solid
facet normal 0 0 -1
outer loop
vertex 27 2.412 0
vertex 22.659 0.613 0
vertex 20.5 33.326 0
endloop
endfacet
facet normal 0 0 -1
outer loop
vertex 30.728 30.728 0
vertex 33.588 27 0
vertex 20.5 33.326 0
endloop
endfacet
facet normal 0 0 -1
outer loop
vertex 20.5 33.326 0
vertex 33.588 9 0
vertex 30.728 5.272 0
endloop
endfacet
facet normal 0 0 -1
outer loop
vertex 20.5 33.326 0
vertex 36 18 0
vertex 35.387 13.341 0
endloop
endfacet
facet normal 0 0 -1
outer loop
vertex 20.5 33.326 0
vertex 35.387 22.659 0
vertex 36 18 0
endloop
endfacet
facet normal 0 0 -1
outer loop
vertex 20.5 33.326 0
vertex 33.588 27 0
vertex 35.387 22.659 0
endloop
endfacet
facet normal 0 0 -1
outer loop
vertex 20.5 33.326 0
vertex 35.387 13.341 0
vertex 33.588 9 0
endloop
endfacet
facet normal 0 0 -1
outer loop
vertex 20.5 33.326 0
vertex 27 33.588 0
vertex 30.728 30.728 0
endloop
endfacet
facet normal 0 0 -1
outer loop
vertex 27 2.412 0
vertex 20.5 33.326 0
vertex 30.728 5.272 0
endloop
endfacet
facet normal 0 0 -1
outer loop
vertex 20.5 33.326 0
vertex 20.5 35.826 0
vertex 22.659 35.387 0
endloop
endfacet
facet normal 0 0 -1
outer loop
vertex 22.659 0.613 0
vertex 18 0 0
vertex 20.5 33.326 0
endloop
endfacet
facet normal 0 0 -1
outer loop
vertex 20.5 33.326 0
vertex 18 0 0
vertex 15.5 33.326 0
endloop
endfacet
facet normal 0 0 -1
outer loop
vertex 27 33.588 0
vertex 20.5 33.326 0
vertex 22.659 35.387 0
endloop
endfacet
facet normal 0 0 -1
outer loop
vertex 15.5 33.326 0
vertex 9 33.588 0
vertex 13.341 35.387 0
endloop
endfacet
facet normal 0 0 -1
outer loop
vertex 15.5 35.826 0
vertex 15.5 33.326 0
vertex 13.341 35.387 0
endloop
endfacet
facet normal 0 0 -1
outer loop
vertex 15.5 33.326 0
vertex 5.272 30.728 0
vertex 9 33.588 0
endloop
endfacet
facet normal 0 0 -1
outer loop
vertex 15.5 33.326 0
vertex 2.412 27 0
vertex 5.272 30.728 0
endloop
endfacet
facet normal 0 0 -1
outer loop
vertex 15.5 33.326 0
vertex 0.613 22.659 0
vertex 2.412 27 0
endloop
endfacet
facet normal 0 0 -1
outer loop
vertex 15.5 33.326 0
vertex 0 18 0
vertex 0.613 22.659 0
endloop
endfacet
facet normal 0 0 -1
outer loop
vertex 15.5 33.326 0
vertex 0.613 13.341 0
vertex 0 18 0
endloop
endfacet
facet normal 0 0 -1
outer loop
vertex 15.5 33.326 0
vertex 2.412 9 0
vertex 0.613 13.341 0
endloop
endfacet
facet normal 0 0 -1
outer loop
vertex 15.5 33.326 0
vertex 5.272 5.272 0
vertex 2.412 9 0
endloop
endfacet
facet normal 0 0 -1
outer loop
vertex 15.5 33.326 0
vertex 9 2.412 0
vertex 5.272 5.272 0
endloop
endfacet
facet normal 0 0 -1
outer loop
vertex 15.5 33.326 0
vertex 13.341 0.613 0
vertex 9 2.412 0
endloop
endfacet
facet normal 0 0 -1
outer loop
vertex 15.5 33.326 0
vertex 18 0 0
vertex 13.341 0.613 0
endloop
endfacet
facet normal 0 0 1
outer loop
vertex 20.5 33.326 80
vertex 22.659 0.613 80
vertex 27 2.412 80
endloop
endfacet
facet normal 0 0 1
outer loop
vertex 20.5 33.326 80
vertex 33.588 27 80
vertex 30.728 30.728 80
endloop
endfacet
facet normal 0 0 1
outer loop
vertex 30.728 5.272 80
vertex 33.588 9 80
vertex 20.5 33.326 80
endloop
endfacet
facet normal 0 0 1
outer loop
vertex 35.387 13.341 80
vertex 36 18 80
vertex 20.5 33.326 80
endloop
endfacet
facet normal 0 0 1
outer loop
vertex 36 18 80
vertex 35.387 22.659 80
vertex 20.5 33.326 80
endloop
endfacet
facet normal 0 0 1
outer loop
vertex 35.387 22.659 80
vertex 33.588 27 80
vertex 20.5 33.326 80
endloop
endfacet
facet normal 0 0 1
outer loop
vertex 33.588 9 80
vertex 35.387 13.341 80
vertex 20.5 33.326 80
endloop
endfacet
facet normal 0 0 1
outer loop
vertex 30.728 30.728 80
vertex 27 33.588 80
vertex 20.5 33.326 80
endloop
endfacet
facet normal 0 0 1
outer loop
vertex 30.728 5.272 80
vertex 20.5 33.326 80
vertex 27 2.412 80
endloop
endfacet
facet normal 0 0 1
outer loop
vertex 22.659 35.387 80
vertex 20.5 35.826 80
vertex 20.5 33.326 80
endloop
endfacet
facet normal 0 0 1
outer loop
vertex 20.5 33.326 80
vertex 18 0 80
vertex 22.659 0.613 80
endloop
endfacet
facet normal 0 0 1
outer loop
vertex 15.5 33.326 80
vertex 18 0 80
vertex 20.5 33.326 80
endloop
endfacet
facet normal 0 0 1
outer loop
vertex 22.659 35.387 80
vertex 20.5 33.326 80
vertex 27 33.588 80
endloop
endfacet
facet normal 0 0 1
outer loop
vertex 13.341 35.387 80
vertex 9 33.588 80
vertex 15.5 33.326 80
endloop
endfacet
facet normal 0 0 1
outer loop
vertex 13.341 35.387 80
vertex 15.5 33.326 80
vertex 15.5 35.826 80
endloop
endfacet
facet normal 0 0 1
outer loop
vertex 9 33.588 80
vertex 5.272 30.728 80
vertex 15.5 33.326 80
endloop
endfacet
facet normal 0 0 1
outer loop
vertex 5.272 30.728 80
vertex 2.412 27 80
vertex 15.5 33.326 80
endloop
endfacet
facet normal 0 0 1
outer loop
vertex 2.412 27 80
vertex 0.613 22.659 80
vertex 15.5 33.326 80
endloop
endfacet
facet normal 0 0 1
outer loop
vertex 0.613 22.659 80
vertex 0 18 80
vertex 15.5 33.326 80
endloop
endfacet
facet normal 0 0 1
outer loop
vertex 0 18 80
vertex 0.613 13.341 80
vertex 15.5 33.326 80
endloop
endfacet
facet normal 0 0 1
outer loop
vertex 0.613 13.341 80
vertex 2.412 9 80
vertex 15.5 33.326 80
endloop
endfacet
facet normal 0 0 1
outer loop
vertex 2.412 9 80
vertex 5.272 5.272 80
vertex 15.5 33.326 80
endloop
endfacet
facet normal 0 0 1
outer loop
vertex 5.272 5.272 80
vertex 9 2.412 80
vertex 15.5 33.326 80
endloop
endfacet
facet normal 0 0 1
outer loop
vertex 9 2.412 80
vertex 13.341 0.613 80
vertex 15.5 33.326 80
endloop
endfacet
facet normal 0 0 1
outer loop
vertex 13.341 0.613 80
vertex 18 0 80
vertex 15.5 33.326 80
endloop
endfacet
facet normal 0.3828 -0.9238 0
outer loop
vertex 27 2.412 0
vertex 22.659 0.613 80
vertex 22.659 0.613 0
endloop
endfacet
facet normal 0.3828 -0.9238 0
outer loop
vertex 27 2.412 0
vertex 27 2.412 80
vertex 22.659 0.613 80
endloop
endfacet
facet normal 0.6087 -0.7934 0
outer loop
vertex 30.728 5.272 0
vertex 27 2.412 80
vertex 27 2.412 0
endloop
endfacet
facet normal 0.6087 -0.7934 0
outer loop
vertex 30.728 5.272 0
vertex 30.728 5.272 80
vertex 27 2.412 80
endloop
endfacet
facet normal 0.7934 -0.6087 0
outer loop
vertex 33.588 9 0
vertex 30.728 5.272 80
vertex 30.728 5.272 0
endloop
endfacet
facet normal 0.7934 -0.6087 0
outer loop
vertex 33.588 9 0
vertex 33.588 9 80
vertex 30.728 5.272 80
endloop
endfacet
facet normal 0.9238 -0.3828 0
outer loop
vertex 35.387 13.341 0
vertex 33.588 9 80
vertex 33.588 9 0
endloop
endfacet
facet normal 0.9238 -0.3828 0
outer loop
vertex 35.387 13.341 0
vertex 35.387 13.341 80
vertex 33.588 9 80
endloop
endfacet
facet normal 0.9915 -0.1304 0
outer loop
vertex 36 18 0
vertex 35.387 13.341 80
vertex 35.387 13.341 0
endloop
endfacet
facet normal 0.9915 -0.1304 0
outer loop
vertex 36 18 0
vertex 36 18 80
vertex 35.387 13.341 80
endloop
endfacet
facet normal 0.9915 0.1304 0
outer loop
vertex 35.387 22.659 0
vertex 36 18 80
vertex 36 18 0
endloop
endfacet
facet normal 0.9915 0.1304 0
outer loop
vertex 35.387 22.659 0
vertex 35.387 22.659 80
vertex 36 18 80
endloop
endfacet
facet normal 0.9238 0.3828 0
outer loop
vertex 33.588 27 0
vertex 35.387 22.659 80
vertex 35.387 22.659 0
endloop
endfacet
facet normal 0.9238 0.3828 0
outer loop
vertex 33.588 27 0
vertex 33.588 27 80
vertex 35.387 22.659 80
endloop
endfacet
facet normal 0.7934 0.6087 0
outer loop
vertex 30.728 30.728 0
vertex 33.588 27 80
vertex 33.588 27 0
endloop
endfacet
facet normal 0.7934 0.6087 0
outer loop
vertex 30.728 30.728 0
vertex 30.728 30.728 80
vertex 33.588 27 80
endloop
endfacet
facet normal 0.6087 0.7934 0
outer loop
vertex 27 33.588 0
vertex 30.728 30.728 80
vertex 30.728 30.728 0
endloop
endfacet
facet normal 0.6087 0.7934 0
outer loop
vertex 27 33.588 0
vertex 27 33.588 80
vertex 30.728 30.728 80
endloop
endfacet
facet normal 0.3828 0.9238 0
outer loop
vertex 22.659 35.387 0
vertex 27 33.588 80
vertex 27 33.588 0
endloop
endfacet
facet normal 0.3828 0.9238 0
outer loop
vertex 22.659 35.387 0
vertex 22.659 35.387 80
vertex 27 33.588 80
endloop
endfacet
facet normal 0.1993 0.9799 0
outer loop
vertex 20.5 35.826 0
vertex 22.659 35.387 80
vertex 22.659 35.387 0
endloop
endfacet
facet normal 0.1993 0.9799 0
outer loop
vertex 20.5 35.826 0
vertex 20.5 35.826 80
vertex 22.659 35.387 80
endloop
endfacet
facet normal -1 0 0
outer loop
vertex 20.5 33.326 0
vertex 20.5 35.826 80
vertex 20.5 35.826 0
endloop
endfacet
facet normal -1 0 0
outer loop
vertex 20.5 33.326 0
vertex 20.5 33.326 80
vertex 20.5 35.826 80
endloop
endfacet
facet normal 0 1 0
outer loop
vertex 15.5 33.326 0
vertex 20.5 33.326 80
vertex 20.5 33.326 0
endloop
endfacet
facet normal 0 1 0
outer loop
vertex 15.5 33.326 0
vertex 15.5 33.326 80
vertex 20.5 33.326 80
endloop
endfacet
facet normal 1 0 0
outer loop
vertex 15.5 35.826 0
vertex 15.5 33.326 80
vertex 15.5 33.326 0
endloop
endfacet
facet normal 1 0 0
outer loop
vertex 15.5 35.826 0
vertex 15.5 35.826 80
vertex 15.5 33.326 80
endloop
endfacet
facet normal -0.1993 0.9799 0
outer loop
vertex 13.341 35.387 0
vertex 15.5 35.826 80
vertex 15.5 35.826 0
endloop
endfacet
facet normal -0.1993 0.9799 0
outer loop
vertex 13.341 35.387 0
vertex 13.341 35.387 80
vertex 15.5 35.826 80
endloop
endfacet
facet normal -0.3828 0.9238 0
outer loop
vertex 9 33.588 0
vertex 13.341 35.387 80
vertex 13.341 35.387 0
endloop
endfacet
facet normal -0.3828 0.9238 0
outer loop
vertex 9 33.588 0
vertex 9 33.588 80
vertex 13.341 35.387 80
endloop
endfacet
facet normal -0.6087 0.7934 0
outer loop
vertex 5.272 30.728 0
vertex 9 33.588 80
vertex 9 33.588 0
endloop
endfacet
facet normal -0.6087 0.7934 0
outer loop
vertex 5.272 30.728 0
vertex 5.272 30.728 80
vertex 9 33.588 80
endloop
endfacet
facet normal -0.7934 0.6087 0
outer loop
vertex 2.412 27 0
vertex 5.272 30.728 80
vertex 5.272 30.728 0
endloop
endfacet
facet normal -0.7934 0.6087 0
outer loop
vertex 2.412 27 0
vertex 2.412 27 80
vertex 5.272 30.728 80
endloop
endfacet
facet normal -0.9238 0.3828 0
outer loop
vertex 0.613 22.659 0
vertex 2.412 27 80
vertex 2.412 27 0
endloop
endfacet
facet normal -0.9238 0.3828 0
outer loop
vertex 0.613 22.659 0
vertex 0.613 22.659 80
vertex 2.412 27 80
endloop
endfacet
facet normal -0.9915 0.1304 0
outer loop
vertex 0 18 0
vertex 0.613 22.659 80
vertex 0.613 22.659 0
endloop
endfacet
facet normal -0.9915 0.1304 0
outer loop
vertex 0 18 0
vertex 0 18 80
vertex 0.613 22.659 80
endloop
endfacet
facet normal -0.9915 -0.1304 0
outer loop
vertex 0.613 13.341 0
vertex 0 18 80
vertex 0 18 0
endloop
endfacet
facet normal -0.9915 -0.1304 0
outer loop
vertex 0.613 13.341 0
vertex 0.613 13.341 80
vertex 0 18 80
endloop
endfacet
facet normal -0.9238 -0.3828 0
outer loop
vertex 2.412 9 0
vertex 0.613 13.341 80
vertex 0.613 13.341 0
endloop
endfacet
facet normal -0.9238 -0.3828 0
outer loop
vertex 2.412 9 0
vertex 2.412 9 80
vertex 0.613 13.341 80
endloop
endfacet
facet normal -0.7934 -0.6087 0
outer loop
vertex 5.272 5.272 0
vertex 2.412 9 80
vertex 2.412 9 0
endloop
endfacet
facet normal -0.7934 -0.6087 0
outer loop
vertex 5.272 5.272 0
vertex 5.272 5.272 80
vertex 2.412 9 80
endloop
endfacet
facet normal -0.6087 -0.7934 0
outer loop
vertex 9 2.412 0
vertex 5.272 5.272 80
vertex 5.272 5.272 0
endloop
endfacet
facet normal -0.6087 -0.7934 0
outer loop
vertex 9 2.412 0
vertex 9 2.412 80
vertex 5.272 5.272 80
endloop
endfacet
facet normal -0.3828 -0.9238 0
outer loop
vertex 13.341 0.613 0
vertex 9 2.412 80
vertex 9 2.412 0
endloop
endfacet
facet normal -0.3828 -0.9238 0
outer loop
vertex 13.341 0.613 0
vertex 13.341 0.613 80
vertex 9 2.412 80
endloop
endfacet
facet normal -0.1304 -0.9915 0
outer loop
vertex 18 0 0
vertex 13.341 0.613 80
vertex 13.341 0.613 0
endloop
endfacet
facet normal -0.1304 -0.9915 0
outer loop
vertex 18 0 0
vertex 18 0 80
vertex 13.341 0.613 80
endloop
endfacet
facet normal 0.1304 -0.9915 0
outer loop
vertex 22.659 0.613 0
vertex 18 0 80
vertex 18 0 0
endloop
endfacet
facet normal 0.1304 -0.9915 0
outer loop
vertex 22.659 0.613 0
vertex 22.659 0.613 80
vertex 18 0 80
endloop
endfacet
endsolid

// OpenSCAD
$fn = 32;

// ----------------------------------------------------------------------
// Keyway shaft: d36 shaft, key 5 x 2.5 mm
// ----------------------------------------------------------------------

// --- parameters (mm) ---
shaft_r = 18;             // shaft radius
key_w = 5;                // keyway width
key_d = 2.5;              // keyway depth below the surface line
plate_t = 80;             // shaft length, Z (extrusion height)

shaft_d = 2 * shaft_r;  // shaft diameter
circle_step = 15;  // polygon sampling step, degrees

profile = [[13.341, 35.387], [9, 33.588], [5.272, 30.728], [2.412, 27], [0.613, 22.659], [0, 18], [0.613, 13.341], [2.412, 9], [5.272, 5.272], [9, 2.412], [13.341, 0.613], [18, 0], [22.659, 0.613], [27, 2.412], [30.728, 5.272], [33.588, 9], [35.387, 13.341], [36, 18], [35.387, 22.659], [33.588, 27], [30.728, 30.728], [27, 33.588], [22.659, 35.387], [20.5, 35.826], [20.5, 33.326], [15.5, 33.326], [15.5, 35.826]];  // primary outline, 27 points, counter clockwise

// --- the one profile operation ---
linear_extrude(height = plate_t) polygon(points = profile);
